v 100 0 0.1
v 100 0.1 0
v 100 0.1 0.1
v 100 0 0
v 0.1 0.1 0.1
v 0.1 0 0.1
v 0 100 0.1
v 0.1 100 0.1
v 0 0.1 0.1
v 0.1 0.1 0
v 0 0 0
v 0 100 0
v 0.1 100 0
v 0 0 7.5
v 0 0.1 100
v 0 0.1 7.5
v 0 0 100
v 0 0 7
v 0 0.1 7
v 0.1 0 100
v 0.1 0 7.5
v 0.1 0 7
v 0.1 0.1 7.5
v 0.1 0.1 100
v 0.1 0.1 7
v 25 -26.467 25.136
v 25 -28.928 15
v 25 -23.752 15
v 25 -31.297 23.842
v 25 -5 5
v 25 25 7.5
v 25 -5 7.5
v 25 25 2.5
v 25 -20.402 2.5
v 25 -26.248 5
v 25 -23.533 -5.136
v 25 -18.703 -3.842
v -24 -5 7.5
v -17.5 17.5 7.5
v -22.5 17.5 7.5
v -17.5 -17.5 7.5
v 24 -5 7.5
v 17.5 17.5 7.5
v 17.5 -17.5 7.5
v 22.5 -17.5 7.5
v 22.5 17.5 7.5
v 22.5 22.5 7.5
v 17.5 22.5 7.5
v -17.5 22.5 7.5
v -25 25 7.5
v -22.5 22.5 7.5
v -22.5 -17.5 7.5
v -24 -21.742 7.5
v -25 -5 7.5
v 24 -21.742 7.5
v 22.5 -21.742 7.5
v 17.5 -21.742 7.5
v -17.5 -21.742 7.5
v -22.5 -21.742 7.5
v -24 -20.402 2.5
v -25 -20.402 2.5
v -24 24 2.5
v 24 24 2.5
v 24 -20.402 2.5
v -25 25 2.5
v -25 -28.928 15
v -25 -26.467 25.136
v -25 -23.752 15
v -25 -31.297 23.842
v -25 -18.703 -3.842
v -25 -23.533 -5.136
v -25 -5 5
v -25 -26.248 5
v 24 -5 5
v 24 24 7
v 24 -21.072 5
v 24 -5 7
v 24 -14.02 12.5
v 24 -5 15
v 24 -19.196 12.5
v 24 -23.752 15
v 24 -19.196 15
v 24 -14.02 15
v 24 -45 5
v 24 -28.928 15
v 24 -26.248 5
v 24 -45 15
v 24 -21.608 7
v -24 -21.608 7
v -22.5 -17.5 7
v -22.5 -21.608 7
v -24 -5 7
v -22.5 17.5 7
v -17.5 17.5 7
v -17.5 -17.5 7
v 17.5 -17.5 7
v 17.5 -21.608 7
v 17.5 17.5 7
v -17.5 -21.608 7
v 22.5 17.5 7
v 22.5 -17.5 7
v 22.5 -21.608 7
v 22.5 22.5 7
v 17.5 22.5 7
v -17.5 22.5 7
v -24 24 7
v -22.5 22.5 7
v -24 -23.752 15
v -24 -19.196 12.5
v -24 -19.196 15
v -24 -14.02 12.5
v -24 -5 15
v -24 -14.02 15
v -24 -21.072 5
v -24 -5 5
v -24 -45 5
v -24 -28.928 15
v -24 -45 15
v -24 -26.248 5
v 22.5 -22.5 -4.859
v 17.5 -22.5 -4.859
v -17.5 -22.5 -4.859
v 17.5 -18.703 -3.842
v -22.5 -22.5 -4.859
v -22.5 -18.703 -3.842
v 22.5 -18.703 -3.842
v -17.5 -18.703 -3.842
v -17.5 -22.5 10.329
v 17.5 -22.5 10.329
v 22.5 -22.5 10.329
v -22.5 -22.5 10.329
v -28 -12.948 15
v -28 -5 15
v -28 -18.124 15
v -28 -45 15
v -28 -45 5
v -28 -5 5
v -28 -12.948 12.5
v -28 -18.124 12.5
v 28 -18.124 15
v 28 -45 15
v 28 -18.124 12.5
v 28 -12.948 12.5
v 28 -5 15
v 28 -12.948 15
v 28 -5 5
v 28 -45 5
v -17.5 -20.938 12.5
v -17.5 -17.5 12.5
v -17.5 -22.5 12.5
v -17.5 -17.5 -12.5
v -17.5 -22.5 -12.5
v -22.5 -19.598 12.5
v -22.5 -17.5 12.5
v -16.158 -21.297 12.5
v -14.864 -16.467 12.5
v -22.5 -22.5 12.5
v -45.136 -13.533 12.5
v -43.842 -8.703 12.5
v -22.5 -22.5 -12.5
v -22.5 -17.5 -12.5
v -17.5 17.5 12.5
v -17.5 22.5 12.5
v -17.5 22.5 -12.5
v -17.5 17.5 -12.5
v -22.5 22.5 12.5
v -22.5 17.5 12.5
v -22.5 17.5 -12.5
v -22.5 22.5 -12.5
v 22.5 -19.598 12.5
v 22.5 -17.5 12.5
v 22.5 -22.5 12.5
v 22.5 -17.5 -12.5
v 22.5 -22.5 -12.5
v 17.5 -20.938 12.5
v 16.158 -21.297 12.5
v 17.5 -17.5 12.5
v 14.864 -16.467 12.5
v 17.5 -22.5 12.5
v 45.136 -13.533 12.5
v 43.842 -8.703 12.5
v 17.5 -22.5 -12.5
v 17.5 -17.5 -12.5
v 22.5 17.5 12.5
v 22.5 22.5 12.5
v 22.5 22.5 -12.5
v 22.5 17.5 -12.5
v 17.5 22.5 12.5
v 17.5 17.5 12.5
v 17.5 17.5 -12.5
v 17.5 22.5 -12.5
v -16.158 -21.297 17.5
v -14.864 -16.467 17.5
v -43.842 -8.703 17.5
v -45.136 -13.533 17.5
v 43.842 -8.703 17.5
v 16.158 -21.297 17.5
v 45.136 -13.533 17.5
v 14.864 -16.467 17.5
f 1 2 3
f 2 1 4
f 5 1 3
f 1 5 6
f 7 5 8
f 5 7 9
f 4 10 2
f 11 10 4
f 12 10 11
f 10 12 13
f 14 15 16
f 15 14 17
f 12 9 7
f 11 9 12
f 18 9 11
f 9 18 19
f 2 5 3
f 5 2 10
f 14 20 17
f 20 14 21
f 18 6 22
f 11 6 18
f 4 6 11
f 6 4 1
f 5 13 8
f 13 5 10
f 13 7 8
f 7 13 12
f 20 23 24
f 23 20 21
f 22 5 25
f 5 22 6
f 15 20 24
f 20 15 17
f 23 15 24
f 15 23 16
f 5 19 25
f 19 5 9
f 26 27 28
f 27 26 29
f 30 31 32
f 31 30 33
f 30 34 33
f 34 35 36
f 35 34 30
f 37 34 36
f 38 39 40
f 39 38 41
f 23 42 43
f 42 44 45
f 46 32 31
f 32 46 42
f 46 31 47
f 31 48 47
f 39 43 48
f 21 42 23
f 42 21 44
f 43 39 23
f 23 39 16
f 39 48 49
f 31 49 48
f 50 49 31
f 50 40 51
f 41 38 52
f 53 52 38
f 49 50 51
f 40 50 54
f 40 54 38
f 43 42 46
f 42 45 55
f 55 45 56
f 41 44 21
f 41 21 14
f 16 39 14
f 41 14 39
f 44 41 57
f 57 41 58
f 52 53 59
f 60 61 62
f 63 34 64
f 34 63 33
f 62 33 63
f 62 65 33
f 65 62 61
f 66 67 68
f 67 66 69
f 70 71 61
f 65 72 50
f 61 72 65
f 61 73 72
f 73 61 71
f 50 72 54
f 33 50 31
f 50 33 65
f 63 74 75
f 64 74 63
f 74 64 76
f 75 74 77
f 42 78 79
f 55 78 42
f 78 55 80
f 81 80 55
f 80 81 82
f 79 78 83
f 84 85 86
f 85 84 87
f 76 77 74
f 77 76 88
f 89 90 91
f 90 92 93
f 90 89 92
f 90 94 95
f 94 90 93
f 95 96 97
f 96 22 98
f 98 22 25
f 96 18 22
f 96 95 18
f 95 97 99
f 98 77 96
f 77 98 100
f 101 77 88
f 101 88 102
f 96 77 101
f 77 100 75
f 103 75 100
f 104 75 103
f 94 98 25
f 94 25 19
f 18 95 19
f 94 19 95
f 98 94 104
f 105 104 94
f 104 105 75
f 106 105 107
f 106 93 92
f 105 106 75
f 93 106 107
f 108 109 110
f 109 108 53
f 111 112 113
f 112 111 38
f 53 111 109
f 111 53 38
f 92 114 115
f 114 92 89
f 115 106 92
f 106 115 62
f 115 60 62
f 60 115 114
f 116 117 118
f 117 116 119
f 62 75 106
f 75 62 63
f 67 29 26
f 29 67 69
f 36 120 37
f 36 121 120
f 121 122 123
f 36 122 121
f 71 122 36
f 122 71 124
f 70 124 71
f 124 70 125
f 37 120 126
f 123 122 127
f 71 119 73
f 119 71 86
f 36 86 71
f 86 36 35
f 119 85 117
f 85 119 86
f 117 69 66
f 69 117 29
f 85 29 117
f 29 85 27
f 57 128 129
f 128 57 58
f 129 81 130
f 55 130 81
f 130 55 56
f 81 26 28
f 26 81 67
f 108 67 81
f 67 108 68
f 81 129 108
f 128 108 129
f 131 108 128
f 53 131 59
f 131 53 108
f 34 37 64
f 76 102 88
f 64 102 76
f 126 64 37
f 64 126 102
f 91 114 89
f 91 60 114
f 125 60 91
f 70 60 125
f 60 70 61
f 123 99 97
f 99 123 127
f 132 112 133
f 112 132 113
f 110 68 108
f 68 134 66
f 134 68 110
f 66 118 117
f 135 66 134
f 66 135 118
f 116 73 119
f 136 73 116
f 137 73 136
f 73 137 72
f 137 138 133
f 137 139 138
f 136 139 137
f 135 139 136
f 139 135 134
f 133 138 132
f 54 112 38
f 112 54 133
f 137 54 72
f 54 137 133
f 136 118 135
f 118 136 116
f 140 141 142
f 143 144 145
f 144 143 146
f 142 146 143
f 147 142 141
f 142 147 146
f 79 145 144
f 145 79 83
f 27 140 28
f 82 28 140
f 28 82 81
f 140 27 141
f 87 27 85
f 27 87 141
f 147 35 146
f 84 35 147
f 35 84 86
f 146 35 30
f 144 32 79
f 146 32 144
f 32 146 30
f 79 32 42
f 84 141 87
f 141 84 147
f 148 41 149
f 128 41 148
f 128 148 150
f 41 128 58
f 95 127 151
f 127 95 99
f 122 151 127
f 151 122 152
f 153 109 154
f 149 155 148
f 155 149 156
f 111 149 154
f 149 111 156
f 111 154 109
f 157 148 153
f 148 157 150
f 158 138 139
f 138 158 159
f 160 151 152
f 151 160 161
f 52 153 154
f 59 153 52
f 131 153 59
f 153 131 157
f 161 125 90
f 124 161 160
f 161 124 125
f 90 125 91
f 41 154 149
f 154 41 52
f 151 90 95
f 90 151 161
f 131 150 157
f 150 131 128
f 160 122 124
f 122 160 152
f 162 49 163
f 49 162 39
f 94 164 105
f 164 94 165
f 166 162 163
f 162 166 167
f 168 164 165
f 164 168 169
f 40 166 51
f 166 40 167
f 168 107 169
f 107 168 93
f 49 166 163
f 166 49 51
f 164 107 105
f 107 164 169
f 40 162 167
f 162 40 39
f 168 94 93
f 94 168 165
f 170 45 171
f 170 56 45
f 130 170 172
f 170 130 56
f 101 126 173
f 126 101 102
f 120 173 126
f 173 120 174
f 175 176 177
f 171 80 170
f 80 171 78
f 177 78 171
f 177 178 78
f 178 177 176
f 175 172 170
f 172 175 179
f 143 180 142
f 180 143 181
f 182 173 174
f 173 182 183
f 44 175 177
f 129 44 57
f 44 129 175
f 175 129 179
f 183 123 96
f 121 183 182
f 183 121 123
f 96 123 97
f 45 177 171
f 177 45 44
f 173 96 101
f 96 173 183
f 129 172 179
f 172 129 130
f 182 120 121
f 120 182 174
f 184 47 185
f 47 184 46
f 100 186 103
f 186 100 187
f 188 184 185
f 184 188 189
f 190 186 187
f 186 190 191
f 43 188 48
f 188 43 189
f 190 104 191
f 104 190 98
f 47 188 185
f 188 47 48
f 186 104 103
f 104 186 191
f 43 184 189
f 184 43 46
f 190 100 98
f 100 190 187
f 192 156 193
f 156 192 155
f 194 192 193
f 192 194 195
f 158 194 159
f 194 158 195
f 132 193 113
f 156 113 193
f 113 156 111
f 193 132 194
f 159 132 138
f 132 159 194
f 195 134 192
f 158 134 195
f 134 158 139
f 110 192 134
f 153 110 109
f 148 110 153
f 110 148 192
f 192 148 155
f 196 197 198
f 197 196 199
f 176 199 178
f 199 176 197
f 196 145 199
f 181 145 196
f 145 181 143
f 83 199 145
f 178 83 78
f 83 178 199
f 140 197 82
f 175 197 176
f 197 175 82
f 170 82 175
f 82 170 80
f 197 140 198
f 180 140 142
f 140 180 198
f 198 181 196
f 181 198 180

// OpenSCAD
    // Combined Scene

    // Permanent Model
    
    // Permanent Model (Black)
    color([0, 0, 0]) {
        // Your permanent model code here
        cube([100,0.1,0.1], center = false);
        cube([0.1,100,0.1], center = false);
        cube([0.1,0.1,100], center = false);
    }
    

    // Dynamic Model
    union() {
    // Seat
    translate([0, 0, 5])
    difference() {
        cube([50, 50, 5], center=true); // Main seat
        translate([0, 0, -1])
        cube([48, 48, 6], center=true); // Cutout for better contact with the print bed
    }

    // Backrest
    translate([0, -25, 10])
    rotate([15, 0, 0])
    cube([50, 5, 30], center=true); // Angled backrest

    // Side supports for the backrest
    translate([-26, -25, 10])
    cube([4, 40, 10], center=true); // Left support
    translate([26, -25, 10])
    cube([4, 40, 10], center=true); // Right support

    // Front legs
    translate([-20, -20, 0])
    cube([5, 5, 25], center=true); // Left front leg
    translate([-20, 20, 0])
    cube([5, 5, 25], center=true); // Right front leg

    // Rear legs
    translate([20, -20, 0])
    cube([5, 5, 25], center=true); // Left rear leg
    translate([20, 20, 0])
    cube([5, 5, 25], center=true); // Right rear leg

    // Optional Armrests
    translate([-30, -15, 15])
    rotate([0, 0, -15])
    cube([30, 5, 5], center=true); // Left armrest
    translate([30, -15, 15])
    rotate([0, 0, 15])
    cube([30, 5, 5], center=true); // Right armrest
}
    
